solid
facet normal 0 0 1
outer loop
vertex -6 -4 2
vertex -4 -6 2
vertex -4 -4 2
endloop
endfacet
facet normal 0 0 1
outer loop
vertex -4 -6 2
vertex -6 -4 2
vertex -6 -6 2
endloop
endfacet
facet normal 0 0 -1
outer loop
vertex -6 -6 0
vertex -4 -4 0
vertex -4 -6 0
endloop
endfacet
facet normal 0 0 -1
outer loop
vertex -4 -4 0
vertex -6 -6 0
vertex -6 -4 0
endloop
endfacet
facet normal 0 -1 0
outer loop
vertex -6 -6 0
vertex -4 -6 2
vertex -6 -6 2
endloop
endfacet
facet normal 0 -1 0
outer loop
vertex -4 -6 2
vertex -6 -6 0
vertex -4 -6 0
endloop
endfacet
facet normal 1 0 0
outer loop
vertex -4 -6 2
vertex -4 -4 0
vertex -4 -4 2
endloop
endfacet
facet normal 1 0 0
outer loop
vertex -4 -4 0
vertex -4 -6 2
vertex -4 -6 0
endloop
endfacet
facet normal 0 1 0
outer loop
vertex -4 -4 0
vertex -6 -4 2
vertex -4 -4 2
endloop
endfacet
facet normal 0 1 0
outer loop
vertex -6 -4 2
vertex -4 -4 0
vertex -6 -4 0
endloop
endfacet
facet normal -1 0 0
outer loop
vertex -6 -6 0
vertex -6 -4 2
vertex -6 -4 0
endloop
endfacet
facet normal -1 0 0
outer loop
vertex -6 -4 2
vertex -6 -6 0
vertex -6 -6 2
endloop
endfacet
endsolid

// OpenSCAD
union() {
  translate([-6, -6, 0]) cube(size=[2,2,2], center=false);
}
